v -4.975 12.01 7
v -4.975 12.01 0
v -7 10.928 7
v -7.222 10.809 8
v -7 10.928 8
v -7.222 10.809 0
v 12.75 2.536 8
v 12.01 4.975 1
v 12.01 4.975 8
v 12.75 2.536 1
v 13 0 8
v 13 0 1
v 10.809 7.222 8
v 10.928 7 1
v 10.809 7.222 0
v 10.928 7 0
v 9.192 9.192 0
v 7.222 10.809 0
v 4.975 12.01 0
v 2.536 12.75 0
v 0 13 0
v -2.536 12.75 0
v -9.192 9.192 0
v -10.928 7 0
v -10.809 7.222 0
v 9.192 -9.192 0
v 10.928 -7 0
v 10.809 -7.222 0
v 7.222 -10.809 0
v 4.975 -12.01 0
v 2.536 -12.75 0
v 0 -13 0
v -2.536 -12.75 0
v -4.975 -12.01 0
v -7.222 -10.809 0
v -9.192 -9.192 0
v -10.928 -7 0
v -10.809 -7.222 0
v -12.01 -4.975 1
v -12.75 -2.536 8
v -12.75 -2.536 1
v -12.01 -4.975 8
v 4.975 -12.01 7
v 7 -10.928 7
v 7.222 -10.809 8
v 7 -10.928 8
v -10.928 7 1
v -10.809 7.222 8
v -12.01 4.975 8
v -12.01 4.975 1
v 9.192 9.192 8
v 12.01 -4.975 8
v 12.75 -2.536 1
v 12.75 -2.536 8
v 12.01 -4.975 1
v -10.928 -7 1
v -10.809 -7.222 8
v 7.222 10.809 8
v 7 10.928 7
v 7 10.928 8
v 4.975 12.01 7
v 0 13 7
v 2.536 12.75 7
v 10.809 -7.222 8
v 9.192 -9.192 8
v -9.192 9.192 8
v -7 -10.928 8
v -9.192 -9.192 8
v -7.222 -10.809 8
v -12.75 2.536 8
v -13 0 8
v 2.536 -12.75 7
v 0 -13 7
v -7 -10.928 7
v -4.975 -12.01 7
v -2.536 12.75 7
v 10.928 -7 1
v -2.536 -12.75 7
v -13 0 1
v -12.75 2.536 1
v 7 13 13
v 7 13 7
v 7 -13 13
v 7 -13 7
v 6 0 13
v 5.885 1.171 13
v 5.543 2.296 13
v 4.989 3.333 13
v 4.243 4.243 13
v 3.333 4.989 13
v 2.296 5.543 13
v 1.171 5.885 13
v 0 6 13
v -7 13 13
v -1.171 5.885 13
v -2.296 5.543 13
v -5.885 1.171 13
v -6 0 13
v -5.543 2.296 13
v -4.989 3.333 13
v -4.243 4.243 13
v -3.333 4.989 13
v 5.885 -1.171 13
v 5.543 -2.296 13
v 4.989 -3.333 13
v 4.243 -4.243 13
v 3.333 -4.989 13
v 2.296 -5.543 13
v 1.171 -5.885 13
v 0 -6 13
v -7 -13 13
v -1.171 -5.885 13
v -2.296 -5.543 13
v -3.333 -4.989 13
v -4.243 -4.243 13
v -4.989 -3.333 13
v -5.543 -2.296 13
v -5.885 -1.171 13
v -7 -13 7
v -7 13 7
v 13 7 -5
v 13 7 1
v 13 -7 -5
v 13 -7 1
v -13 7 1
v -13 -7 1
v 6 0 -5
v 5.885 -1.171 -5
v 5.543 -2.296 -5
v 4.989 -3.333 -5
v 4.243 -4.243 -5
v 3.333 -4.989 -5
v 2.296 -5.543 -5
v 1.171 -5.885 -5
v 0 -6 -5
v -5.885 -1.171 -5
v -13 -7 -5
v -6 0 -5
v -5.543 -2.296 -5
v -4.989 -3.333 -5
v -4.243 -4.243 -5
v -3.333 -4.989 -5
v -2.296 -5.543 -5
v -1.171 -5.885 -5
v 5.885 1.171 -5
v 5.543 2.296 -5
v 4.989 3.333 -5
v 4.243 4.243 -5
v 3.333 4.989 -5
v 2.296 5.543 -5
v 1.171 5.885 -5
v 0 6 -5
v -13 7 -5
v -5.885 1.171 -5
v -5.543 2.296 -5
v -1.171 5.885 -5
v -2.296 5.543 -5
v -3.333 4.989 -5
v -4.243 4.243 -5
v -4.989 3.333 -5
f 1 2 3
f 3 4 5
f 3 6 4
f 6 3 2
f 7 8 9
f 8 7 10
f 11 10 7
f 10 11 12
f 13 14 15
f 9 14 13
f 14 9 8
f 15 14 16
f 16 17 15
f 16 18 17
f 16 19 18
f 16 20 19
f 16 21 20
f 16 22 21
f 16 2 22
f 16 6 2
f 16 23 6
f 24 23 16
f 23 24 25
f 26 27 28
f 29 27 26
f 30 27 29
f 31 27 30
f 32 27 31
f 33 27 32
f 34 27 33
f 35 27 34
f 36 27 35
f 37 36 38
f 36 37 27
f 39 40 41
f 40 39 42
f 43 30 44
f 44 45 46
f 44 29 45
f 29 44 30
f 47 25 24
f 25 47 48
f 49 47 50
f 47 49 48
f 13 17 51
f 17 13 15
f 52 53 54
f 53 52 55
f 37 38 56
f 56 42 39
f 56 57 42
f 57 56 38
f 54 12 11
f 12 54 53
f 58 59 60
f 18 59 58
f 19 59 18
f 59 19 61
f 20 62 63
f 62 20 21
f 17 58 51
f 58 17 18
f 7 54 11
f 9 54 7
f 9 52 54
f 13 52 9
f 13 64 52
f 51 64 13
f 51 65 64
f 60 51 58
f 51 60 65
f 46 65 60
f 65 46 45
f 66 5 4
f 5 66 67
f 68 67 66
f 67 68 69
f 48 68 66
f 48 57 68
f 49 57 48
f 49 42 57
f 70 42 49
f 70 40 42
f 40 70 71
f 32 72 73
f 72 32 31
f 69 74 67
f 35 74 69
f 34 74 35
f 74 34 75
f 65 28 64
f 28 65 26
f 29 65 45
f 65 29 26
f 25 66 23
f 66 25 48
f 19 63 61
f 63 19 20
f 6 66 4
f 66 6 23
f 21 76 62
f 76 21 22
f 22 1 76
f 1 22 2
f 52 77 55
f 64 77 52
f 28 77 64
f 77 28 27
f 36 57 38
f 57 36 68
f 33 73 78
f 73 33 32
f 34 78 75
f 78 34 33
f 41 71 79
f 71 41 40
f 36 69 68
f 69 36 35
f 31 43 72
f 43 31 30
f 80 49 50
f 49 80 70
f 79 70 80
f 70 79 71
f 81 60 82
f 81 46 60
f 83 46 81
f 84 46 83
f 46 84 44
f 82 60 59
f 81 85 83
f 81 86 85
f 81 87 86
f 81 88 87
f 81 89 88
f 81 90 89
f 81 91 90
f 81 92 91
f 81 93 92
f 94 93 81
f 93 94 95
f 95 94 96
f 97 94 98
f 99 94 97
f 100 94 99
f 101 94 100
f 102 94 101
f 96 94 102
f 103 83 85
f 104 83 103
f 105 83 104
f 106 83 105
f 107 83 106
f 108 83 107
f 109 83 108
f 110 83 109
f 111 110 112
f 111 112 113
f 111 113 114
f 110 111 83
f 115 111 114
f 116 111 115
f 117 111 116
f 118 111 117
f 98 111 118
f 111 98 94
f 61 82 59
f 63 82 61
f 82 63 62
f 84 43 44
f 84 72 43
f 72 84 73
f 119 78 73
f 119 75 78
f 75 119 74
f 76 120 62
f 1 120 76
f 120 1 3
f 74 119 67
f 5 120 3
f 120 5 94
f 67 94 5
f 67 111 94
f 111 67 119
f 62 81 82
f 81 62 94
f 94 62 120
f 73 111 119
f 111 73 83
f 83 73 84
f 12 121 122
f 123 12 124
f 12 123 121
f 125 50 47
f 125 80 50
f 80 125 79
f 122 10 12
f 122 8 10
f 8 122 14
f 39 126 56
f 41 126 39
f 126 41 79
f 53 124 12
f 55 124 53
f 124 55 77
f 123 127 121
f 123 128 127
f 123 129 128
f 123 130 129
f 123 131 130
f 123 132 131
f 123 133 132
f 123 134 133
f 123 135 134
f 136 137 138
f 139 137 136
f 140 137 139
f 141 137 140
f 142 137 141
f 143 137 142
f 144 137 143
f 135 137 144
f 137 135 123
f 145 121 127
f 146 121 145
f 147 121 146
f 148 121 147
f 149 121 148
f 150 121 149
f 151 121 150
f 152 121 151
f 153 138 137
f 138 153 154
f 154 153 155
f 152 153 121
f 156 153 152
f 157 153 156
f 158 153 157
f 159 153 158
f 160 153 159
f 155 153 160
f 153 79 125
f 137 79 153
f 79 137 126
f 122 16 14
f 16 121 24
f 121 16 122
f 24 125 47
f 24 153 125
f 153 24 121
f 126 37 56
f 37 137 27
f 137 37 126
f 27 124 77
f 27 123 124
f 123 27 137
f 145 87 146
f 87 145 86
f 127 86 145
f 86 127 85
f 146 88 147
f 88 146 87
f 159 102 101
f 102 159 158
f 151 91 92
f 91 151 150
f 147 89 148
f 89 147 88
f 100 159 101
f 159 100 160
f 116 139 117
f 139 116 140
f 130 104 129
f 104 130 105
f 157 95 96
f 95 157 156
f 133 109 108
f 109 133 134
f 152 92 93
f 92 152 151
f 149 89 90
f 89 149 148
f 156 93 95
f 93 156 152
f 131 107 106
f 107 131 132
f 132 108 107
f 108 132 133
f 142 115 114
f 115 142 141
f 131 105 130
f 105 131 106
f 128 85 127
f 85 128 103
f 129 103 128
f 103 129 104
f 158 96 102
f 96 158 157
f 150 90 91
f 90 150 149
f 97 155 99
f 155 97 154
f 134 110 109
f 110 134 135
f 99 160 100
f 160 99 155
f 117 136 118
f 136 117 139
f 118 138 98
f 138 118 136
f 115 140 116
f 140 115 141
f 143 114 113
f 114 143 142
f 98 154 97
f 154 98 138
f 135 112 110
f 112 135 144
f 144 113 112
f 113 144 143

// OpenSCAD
$fn = 32;

// ----------------------------------------------------------------------
// Oldham coupling disc: 26 x 18 mm
// ----------------------------------------------------------------------

// --- parameters (mm) ---
disc_d = 26;              // disc diameter
disc_t = 8;               // disc thickness
tongue_w = 14;            // tongue width
tongue_h = 5;             // tongue height
bore_d = 12;              // centre lightening bore

module disc() {
  cylinder(h = disc_t, d = disc_d);
  /* tongue on the top face, sunk 1 mm into the disc */
  translate([-tongue_w / 2, -disc_d / 2, disc_t - 1]) cube([tongue_w, disc_d, tongue_h + 1]);
  /* slot wall on the bottom face, 90 degrees turned */
  translate([-disc_d / 2, -tongue_w / 2, -tongue_h]) cube([disc_d, tongue_w, tongue_h + 1]);
}

difference() {
  disc();
  translate([0, 0, -tongue_h - 1]) cylinder(h = disc_t + 2 * tongue_h + 2, d = bore_d);
}
